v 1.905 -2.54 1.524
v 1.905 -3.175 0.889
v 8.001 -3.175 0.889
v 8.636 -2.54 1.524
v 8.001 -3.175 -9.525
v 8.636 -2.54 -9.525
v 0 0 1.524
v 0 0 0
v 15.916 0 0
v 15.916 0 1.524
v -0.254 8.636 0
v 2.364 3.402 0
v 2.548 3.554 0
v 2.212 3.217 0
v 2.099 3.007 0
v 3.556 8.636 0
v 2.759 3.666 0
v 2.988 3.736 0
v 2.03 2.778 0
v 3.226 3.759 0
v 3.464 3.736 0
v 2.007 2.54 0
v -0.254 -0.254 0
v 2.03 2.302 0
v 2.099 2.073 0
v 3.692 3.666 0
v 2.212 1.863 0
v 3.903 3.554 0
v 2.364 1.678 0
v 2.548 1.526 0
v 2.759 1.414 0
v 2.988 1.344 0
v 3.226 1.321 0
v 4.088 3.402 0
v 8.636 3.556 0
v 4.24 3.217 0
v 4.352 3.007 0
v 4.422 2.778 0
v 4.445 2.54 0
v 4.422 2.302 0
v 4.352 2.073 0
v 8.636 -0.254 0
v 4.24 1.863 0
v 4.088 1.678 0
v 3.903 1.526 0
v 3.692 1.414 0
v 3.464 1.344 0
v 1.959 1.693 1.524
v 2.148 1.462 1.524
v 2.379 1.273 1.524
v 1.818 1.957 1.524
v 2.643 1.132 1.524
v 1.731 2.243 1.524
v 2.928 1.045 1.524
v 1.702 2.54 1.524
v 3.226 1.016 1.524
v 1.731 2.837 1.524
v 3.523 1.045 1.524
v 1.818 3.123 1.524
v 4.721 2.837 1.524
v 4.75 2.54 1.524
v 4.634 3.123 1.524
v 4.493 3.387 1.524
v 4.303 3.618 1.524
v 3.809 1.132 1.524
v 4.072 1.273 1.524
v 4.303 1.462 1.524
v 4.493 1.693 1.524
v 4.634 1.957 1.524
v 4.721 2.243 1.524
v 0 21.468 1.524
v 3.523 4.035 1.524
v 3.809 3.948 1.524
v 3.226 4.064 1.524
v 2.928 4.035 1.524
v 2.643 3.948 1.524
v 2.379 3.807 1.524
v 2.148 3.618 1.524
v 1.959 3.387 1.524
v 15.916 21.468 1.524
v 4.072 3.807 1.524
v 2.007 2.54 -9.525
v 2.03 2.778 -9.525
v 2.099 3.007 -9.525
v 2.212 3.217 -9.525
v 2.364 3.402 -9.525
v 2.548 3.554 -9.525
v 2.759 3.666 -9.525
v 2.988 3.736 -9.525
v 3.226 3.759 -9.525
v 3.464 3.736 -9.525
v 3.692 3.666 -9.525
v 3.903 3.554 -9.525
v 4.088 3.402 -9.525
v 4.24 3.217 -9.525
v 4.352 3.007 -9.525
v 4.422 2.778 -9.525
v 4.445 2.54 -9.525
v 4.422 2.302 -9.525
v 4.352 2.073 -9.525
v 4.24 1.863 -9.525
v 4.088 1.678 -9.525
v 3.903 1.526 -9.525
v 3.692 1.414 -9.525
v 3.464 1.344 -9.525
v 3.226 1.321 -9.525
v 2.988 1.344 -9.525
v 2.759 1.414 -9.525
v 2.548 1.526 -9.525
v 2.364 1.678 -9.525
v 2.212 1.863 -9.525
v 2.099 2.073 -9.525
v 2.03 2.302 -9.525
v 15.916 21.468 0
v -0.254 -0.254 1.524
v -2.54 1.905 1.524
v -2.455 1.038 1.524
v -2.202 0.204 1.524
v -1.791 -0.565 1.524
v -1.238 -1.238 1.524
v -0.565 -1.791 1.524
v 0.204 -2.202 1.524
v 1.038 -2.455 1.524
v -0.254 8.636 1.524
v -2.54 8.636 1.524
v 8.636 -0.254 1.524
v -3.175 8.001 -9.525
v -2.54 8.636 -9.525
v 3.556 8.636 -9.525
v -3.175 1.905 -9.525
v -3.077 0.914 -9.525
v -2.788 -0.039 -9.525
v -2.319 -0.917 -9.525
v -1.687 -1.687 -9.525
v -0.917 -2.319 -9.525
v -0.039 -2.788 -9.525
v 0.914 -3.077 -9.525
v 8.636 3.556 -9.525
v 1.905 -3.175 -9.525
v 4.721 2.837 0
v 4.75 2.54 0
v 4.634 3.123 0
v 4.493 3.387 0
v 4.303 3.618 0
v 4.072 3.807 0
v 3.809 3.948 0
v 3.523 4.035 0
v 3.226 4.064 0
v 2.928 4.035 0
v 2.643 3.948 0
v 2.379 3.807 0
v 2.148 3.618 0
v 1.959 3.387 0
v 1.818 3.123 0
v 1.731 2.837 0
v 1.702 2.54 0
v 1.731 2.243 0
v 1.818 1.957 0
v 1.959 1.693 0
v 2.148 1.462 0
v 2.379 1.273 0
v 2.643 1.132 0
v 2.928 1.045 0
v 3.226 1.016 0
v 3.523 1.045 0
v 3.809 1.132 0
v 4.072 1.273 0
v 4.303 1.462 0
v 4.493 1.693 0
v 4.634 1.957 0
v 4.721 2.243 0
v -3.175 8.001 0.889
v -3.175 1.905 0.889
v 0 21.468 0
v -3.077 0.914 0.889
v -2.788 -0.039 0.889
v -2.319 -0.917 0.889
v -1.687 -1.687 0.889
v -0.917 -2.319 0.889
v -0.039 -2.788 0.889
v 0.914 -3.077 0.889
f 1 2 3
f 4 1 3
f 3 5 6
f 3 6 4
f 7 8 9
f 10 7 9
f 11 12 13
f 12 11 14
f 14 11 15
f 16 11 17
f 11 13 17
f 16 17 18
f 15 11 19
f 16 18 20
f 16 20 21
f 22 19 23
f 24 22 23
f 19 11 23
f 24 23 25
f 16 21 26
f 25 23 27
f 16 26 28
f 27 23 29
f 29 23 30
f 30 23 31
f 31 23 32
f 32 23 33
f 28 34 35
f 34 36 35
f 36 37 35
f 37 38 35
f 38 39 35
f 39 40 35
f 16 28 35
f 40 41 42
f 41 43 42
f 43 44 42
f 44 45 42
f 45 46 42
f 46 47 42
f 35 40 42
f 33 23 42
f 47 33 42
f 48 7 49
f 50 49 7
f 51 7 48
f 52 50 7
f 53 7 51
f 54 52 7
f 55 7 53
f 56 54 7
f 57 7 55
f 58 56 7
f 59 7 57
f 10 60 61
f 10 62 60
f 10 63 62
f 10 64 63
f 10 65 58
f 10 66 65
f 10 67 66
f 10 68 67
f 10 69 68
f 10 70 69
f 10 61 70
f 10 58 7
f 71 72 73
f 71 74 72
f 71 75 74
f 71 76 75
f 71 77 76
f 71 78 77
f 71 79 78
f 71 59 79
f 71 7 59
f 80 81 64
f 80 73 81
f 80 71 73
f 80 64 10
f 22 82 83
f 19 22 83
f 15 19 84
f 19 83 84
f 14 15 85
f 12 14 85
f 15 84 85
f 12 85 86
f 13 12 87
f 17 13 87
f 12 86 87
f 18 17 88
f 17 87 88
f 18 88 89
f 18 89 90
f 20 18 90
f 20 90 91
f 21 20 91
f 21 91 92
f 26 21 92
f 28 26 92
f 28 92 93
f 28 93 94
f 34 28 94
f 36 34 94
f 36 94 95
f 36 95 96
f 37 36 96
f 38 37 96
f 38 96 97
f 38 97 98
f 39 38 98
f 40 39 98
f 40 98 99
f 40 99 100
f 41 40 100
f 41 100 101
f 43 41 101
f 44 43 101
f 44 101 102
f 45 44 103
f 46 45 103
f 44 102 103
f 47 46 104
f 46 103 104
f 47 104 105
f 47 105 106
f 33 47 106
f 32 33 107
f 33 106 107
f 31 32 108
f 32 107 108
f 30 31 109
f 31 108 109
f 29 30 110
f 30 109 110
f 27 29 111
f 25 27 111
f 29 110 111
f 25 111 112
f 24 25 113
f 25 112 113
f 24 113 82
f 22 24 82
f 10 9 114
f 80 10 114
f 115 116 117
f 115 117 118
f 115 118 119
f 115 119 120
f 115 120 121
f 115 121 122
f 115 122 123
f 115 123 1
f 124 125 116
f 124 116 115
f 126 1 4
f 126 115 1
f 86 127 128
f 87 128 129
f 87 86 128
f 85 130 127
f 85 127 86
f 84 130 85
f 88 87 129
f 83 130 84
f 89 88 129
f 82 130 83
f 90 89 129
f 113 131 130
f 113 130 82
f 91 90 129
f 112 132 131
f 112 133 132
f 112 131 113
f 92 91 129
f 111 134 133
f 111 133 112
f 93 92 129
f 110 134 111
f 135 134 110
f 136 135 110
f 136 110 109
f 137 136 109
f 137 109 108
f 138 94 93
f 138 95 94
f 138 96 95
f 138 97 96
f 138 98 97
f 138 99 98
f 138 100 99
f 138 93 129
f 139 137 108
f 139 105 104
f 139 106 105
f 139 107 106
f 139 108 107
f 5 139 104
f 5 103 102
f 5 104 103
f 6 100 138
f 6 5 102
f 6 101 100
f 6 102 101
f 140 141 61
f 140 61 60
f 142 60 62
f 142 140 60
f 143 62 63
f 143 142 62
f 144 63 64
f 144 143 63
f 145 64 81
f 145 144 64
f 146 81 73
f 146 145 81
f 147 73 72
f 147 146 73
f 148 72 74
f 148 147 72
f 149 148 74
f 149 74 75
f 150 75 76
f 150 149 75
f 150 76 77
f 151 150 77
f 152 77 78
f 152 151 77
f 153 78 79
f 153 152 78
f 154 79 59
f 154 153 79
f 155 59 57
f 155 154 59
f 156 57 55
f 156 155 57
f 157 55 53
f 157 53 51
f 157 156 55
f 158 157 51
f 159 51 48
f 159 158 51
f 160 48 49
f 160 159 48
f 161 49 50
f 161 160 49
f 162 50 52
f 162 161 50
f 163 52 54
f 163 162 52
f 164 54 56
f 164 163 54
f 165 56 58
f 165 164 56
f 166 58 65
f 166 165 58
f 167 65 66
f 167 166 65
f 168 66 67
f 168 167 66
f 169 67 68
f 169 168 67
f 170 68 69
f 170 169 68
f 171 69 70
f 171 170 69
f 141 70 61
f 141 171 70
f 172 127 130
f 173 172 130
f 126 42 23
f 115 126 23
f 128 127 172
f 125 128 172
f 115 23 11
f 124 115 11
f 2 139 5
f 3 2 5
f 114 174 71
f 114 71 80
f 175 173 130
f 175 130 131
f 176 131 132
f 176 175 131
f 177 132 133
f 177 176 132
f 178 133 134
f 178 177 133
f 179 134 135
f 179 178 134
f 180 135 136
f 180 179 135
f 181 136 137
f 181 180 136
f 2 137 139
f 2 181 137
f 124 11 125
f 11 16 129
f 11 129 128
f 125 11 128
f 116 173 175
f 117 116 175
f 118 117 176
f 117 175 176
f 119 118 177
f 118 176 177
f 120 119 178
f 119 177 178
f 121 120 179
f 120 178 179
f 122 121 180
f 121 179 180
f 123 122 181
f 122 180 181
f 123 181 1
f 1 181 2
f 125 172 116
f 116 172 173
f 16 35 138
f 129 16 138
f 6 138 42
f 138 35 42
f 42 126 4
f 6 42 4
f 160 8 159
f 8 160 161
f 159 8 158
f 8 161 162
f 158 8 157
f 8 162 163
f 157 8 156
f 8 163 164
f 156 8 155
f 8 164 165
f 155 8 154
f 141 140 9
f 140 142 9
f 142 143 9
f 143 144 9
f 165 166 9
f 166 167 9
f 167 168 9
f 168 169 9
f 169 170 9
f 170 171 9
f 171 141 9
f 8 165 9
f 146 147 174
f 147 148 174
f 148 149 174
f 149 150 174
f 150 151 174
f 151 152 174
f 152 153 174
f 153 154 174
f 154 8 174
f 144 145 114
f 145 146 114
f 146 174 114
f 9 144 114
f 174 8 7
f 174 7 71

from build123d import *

# Parameters (mm, degrees)
F0_W     = 15.9162582783
F0_H     = 21.4676701395
F0_R     = 1.524
F1_DEPTH = 1.524
F2_W     = 11.811
F2_H     = 11.811
F3_DEPTH = 9.525
F5_DEPTH = 1.524
F7_D     = 2.4384
F8_R     = 5.08
F9_SIZE  = 5.08
F10_SIZE = 0.635
F11_SIZE = 0.635


with BuildPart() as f1:
    # F0 (on Top) → F1 (new body)
    with BuildSketch(Plane.XY):
        with Locations((7.9581291392, 10.7338350698)):
            Rectangle(F0_W, F0_H)
        with Locations((3.2258, 2.54)):
            Circle(F0_R, mode=Mode.SUBTRACT)
    extrude(amount=F1_DEPTH)


with BuildPart() as f3:
    # F2 (on face) → F3 (new body)
    with BuildSketch(Plane(origin=(0, 0, 0), x_dir=(1, 0, 0), z_dir=(0, 0, -1))):
        with Locations((2.7305, -2.7305)):
            Rectangle(F2_W, F2_H)
    extrude(amount=F3_DEPTH)

    # F4 (on face) → F5 (join)
    with BuildSketch(Plane.XY):
        Polygon((-0.254, 8.636), (-3.175, 8.636), (-3.175, -3.175), (8.636, -3.175), (8.636, -0.254), (-0.254, -0.254), align=None)
    extrude(amount=F5_DEPTH)

    # F7 (through all)
    with Locations(Plane.XY):
        with Locations((3.2258, 2.54)):
            Hole(F7_D / 2)

    # F8
    f8_edges = [f3.edges().sort_by_distance(p)[0] for p in [
        (-3.175, -3.175, -4.0005),
    ]]
    fillet(f8_edges, radius=F8_R)

    # F9
    f9_edges = [f3.edges().sort_by_distance(p)[0] for p in [
        (8.636, 8.636, -4.7625),
    ]]
    chamfer(f9_edges, length=F9_SIZE)

    # F10
    f10_edges = [f3.edges().sort_by_distance(p)[0] for p in [
        (8.636, -3.175, -4.0005),
        (-3.175, 8.636, -4.0005),
    ]]
    chamfer(f10_edges, length=F10_SIZE)

    # F11
    f11_edges = [f3.edges().sort_by_distance(p)[0] for p in [
        (4.953, -3.175, 1.524),
        (-1.687102, -1.687102, 1.524),
        (-3.175, 4.953, 1.524),
    ]]
    chamfer(f11_edges, length=F11_SIZE)


solid = Compound([f1.part, f3.part])
